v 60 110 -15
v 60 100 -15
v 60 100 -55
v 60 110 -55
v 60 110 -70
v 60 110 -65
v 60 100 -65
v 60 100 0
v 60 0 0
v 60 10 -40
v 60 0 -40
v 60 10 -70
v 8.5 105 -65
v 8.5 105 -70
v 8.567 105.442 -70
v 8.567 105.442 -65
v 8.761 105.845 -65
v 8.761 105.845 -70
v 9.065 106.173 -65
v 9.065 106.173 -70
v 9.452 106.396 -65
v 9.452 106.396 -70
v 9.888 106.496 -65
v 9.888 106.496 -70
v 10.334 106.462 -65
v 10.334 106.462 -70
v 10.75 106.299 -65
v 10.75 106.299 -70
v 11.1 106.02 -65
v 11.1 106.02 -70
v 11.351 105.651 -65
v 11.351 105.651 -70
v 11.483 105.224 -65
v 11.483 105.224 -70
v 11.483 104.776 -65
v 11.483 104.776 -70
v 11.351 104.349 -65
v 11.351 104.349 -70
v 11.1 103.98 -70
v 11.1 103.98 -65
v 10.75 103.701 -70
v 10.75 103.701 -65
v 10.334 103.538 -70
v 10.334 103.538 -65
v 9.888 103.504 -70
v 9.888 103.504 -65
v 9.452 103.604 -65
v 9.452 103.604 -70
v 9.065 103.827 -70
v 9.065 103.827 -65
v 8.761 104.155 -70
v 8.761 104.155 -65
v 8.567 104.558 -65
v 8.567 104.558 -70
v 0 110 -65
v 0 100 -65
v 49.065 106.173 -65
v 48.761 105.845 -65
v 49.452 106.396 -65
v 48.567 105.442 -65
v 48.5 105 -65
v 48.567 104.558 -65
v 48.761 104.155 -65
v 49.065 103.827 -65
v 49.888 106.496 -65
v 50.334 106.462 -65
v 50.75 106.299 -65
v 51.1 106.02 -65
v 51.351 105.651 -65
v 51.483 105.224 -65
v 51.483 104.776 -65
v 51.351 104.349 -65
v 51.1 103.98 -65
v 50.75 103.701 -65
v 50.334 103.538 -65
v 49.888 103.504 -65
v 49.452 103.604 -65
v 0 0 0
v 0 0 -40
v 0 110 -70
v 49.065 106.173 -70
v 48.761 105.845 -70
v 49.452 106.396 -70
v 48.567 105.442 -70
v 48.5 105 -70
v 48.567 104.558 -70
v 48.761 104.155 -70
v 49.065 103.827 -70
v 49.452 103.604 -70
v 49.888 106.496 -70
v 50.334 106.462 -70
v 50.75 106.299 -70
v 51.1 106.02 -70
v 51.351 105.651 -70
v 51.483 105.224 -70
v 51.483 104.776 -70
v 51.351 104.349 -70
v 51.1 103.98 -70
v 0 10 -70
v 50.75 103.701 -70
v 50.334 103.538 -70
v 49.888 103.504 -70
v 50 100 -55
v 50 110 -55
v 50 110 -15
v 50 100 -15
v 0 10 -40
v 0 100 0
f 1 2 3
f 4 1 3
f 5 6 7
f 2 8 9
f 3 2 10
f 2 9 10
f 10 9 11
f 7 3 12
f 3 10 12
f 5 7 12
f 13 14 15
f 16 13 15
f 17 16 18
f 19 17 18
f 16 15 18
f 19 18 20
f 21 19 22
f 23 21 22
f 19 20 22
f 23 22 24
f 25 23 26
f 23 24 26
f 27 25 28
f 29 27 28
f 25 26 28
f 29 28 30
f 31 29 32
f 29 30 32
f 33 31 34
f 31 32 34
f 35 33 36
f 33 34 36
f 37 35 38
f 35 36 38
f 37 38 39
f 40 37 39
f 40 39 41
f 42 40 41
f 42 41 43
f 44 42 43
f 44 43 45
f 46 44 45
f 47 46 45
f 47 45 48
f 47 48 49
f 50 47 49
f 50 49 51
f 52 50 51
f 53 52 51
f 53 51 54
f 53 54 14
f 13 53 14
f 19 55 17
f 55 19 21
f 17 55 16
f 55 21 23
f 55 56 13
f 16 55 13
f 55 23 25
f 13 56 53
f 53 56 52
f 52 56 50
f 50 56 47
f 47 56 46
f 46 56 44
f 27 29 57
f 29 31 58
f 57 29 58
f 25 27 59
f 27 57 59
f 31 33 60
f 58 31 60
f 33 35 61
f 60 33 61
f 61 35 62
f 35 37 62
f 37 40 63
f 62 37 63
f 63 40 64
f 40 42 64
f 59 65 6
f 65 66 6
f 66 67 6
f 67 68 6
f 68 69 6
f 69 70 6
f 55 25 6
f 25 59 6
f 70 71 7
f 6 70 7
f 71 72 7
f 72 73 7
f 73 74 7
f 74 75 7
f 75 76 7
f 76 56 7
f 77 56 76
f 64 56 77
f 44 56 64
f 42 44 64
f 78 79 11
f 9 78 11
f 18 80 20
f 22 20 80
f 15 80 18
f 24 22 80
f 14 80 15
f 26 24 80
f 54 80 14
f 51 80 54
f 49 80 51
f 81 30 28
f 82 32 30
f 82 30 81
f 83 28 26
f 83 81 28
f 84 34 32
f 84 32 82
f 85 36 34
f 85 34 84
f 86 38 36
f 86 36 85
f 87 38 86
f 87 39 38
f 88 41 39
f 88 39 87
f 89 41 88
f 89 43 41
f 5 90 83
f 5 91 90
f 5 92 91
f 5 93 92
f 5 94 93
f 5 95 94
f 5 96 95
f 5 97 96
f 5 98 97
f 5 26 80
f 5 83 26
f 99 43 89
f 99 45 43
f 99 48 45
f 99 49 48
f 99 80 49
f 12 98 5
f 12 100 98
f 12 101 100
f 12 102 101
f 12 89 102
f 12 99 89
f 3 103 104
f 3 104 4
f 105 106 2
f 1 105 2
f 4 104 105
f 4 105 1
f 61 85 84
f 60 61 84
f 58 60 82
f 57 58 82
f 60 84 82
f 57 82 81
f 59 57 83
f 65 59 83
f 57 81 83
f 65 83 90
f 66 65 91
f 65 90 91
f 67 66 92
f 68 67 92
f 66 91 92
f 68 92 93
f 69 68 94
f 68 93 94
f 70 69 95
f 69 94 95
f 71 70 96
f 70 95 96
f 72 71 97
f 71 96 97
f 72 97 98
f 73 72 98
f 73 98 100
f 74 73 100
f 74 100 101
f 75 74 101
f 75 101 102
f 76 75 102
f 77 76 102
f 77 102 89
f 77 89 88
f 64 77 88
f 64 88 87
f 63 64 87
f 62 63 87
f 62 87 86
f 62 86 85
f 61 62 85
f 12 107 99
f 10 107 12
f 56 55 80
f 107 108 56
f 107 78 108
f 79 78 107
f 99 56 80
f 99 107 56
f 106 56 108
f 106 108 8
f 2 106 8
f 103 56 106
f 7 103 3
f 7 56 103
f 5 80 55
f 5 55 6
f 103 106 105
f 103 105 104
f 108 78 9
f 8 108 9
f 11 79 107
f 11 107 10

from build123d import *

# Parameters (mm, degrees)
SKETCH1_W           = 60
SKETCH1_H           = 70
BOSS_EXTRUDE1_DEPTH = 100
SKETCH2_W           = 10
SKETCH2_H           = 40
BOSS_EXTRUDE2_DEPTH = 10
SKETCH5_W           = 60
SKETCH5_H           = 5
BOSS_EXTRUDE4_DEPTH = 10
SKETCH6_R           = 1.5
CUT_EXTRUDE4_DEPTH  = 10
SKETCH7_W           = 60
SKETCH7_H           = 30
CUT_EXTRUDE5_DEPTH  = 10


with BuildPart() as part:
    # Sketch1 → Boss-Extrude1 (new body)
    with BuildSketch(Plane(origin=(0, 0, 0), x_dir=(1, 0, 0), z_dir=(0, 1, 0))):
        with Locations((30, 35)):
            Rectangle(SKETCH1_W, SKETCH1_H)
    extrude(amount=BOSS_EXTRUDE1_DEPTH)

    # Sketch2 → Boss-Extrude2 (add)
    with BuildSketch(Plane(origin=(0, 100, 0), x_dir=(1, 0, 0), z_dir=(0, 1, 0))):
        with Locations((55, 35)):
            Rectangle(SKETCH2_W, SKETCH2_H)
    extrude(amount=BOSS_EXTRUDE2_DEPTH)

    # Sketch5 → Boss-Extrude4 (add)
    with BuildSketch(Plane(origin=(0, 100, 0), x_dir=(1, 0, 0), z_dir=(0, 1, 0))):
        with Locations((30, 67.5)):
            Rectangle(SKETCH5_W, SKETCH5_H)
    extrude(amount=BOSS_EXTRUDE4_DEPTH)

    # Sketch6 → Cut-Extrude4 (cut)
    with BuildSketch(Plane(origin=(0, 0, -70), x_dir=(-1, 0, 0), z_dir=(0, 0, -1))):
        with Locations((-50, 105)):
            Circle(SKETCH6_R)
        with Locations((-10, 105)):
            Circle(SKETCH6_R)
    extrude(amount=-CUT_EXTRUDE4_DEPTH, mode=Mode.SUBTRACT)

    # Sketch7 → Cut-Extrude5 (cut)
    with BuildSketch(Plane.XZ):
        with Locations((30, -55)):
            Rectangle(SKETCH7_W, SKETCH7_H)
    extrude(amount=-CUT_EXTRUDE5_DEPTH, mode=Mode.SUBTRACT)


solid = part.part
